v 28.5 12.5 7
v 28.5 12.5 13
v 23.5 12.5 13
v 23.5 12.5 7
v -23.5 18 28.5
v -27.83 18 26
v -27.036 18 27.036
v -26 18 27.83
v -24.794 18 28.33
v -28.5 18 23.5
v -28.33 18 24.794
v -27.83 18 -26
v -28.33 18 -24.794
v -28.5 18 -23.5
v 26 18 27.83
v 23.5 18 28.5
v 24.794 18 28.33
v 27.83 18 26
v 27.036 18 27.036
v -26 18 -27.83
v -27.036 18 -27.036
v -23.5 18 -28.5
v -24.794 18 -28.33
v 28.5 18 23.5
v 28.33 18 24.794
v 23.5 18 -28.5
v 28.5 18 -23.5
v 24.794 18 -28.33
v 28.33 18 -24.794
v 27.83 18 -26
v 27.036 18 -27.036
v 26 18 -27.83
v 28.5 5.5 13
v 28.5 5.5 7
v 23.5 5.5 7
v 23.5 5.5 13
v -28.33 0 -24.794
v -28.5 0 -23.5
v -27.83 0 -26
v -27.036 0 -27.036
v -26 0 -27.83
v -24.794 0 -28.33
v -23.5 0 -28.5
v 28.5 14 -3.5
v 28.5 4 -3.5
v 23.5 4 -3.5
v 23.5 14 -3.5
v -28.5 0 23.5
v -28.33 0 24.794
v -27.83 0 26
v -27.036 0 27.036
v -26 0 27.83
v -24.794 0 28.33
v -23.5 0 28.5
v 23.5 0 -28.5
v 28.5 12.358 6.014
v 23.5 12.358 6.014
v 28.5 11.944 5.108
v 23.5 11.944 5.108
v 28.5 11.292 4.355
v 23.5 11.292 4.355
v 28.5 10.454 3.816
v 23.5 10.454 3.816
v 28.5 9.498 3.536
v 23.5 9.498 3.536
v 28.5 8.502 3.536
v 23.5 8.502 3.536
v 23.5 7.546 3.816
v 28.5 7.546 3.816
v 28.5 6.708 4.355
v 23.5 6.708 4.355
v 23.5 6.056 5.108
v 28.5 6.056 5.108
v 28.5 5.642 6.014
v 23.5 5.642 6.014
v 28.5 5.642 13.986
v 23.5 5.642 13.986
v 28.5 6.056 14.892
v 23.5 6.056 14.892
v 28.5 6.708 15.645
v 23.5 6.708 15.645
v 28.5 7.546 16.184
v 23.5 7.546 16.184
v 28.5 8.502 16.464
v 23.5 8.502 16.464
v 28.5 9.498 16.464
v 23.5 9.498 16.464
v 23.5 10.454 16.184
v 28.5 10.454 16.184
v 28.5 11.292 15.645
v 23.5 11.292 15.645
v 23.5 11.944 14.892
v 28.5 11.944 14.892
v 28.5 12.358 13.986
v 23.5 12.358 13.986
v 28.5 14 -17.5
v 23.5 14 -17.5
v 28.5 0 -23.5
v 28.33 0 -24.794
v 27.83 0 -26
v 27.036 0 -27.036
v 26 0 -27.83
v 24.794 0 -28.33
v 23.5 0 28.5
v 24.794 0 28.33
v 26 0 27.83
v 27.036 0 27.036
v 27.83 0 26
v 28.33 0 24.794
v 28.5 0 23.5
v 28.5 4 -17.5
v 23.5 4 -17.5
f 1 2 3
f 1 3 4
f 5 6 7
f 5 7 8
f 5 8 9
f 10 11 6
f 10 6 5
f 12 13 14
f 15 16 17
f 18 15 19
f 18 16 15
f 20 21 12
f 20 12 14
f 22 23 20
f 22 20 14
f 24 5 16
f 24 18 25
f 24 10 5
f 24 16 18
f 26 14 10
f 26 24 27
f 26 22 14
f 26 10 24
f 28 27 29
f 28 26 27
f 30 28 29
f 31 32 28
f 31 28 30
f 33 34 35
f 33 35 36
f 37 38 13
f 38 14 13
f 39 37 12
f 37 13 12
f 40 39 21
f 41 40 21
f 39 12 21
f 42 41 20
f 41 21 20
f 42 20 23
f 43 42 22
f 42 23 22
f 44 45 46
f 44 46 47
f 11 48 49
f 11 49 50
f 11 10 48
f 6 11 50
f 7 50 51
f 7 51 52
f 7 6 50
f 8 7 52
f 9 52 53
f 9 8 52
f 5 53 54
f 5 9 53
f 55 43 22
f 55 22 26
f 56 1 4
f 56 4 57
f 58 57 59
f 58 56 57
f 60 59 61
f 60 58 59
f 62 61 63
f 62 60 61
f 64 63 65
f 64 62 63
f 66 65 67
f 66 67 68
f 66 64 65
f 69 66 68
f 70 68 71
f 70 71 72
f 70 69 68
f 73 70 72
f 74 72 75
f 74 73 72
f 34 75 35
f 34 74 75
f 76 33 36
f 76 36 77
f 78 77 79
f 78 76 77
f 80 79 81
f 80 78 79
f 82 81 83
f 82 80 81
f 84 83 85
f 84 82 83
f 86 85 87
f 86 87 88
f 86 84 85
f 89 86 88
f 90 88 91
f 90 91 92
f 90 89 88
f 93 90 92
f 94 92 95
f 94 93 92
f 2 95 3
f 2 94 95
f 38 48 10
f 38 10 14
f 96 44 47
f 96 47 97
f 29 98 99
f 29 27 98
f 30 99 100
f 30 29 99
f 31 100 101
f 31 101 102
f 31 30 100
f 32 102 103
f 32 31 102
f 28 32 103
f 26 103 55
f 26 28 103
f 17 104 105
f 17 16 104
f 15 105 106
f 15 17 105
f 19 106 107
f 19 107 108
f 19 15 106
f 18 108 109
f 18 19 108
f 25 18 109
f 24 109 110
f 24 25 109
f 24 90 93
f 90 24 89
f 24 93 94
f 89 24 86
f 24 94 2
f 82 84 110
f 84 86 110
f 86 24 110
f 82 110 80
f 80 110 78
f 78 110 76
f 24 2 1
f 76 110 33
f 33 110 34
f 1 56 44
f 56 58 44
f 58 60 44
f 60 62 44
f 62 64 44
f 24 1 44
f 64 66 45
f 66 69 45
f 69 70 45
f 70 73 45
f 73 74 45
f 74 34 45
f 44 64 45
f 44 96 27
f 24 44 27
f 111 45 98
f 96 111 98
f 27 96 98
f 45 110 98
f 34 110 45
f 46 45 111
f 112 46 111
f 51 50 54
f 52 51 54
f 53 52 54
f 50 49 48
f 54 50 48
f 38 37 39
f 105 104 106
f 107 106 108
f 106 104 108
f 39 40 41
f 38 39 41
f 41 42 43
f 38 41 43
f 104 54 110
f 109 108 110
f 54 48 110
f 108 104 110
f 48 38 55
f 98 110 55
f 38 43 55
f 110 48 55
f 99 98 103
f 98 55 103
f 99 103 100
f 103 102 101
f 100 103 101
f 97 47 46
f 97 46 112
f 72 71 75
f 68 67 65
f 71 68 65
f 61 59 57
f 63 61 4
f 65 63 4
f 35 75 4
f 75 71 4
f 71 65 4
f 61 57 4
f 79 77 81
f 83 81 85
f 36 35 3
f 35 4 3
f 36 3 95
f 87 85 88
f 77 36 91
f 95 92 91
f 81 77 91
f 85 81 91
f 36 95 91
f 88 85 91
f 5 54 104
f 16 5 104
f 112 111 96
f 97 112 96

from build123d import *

# Parameters (mm, degrees)
CROQUIS1_W              = 57
CROQUIS1_H              = 57
SALIENTE_EXTRUIR1_DEPTH = 18
REDONDEO1_R             = 5
CROQUIS2_W              = 14
CROQUIS2_H              = 10
CORTAR_EXTRUIR1_DEPTH   = 5


with BuildPart() as part:
    # Croquis1 → Saliente-Extruir1 (new body)
    with BuildSketch(Plane(origin=(0, 0, 0), x_dir=(1, 0, 0), z_dir=(0, 1, 0))):
        Rectangle(CROQUIS1_W, CROQUIS1_H)
    extrude(amount=SALIENTE_EXTRUIR1_DEPTH)

    # Redondeo1
    redondeo1_edges = [part.edges().sort_by_distance(p)[0] for p in [
        (-28.5, 9, -28.5),
        (28.5, 9, -28.5),
        (28.5, 9, 28.5),
        (-28.5, 9, 28.5),
    ]]
    fillet(redondeo1_edges, radius=REDONDEO1_R)

    # Croquis2 → Cortar-Extruir1 (cut)
    with BuildSketch(Plane(origin=(28.5, 0, 0), x_dir=(0, 0, -1), z_dir=(1, 0, 0))):
        with BuildLine():
            Line((-13, 12.5), (-7, 12.5))
            ThreePointArc((-7, 12.5), (-3.5, 9), (-7, 5.5))
            Line((-7, 5.5), (-13, 5.5))
            ThreePointArc((-13, 5.5), (-16.5, 9), (-13, 12.5))
        make_face()
        with Locations((10.5, 9)):
            Rectangle(CROQUIS2_W, CROQUIS2_H)
    extrude(amount=-CORTAR_EXTRUIR1_DEPTH, mode=Mode.SUBTRACT)


solid = part.part
